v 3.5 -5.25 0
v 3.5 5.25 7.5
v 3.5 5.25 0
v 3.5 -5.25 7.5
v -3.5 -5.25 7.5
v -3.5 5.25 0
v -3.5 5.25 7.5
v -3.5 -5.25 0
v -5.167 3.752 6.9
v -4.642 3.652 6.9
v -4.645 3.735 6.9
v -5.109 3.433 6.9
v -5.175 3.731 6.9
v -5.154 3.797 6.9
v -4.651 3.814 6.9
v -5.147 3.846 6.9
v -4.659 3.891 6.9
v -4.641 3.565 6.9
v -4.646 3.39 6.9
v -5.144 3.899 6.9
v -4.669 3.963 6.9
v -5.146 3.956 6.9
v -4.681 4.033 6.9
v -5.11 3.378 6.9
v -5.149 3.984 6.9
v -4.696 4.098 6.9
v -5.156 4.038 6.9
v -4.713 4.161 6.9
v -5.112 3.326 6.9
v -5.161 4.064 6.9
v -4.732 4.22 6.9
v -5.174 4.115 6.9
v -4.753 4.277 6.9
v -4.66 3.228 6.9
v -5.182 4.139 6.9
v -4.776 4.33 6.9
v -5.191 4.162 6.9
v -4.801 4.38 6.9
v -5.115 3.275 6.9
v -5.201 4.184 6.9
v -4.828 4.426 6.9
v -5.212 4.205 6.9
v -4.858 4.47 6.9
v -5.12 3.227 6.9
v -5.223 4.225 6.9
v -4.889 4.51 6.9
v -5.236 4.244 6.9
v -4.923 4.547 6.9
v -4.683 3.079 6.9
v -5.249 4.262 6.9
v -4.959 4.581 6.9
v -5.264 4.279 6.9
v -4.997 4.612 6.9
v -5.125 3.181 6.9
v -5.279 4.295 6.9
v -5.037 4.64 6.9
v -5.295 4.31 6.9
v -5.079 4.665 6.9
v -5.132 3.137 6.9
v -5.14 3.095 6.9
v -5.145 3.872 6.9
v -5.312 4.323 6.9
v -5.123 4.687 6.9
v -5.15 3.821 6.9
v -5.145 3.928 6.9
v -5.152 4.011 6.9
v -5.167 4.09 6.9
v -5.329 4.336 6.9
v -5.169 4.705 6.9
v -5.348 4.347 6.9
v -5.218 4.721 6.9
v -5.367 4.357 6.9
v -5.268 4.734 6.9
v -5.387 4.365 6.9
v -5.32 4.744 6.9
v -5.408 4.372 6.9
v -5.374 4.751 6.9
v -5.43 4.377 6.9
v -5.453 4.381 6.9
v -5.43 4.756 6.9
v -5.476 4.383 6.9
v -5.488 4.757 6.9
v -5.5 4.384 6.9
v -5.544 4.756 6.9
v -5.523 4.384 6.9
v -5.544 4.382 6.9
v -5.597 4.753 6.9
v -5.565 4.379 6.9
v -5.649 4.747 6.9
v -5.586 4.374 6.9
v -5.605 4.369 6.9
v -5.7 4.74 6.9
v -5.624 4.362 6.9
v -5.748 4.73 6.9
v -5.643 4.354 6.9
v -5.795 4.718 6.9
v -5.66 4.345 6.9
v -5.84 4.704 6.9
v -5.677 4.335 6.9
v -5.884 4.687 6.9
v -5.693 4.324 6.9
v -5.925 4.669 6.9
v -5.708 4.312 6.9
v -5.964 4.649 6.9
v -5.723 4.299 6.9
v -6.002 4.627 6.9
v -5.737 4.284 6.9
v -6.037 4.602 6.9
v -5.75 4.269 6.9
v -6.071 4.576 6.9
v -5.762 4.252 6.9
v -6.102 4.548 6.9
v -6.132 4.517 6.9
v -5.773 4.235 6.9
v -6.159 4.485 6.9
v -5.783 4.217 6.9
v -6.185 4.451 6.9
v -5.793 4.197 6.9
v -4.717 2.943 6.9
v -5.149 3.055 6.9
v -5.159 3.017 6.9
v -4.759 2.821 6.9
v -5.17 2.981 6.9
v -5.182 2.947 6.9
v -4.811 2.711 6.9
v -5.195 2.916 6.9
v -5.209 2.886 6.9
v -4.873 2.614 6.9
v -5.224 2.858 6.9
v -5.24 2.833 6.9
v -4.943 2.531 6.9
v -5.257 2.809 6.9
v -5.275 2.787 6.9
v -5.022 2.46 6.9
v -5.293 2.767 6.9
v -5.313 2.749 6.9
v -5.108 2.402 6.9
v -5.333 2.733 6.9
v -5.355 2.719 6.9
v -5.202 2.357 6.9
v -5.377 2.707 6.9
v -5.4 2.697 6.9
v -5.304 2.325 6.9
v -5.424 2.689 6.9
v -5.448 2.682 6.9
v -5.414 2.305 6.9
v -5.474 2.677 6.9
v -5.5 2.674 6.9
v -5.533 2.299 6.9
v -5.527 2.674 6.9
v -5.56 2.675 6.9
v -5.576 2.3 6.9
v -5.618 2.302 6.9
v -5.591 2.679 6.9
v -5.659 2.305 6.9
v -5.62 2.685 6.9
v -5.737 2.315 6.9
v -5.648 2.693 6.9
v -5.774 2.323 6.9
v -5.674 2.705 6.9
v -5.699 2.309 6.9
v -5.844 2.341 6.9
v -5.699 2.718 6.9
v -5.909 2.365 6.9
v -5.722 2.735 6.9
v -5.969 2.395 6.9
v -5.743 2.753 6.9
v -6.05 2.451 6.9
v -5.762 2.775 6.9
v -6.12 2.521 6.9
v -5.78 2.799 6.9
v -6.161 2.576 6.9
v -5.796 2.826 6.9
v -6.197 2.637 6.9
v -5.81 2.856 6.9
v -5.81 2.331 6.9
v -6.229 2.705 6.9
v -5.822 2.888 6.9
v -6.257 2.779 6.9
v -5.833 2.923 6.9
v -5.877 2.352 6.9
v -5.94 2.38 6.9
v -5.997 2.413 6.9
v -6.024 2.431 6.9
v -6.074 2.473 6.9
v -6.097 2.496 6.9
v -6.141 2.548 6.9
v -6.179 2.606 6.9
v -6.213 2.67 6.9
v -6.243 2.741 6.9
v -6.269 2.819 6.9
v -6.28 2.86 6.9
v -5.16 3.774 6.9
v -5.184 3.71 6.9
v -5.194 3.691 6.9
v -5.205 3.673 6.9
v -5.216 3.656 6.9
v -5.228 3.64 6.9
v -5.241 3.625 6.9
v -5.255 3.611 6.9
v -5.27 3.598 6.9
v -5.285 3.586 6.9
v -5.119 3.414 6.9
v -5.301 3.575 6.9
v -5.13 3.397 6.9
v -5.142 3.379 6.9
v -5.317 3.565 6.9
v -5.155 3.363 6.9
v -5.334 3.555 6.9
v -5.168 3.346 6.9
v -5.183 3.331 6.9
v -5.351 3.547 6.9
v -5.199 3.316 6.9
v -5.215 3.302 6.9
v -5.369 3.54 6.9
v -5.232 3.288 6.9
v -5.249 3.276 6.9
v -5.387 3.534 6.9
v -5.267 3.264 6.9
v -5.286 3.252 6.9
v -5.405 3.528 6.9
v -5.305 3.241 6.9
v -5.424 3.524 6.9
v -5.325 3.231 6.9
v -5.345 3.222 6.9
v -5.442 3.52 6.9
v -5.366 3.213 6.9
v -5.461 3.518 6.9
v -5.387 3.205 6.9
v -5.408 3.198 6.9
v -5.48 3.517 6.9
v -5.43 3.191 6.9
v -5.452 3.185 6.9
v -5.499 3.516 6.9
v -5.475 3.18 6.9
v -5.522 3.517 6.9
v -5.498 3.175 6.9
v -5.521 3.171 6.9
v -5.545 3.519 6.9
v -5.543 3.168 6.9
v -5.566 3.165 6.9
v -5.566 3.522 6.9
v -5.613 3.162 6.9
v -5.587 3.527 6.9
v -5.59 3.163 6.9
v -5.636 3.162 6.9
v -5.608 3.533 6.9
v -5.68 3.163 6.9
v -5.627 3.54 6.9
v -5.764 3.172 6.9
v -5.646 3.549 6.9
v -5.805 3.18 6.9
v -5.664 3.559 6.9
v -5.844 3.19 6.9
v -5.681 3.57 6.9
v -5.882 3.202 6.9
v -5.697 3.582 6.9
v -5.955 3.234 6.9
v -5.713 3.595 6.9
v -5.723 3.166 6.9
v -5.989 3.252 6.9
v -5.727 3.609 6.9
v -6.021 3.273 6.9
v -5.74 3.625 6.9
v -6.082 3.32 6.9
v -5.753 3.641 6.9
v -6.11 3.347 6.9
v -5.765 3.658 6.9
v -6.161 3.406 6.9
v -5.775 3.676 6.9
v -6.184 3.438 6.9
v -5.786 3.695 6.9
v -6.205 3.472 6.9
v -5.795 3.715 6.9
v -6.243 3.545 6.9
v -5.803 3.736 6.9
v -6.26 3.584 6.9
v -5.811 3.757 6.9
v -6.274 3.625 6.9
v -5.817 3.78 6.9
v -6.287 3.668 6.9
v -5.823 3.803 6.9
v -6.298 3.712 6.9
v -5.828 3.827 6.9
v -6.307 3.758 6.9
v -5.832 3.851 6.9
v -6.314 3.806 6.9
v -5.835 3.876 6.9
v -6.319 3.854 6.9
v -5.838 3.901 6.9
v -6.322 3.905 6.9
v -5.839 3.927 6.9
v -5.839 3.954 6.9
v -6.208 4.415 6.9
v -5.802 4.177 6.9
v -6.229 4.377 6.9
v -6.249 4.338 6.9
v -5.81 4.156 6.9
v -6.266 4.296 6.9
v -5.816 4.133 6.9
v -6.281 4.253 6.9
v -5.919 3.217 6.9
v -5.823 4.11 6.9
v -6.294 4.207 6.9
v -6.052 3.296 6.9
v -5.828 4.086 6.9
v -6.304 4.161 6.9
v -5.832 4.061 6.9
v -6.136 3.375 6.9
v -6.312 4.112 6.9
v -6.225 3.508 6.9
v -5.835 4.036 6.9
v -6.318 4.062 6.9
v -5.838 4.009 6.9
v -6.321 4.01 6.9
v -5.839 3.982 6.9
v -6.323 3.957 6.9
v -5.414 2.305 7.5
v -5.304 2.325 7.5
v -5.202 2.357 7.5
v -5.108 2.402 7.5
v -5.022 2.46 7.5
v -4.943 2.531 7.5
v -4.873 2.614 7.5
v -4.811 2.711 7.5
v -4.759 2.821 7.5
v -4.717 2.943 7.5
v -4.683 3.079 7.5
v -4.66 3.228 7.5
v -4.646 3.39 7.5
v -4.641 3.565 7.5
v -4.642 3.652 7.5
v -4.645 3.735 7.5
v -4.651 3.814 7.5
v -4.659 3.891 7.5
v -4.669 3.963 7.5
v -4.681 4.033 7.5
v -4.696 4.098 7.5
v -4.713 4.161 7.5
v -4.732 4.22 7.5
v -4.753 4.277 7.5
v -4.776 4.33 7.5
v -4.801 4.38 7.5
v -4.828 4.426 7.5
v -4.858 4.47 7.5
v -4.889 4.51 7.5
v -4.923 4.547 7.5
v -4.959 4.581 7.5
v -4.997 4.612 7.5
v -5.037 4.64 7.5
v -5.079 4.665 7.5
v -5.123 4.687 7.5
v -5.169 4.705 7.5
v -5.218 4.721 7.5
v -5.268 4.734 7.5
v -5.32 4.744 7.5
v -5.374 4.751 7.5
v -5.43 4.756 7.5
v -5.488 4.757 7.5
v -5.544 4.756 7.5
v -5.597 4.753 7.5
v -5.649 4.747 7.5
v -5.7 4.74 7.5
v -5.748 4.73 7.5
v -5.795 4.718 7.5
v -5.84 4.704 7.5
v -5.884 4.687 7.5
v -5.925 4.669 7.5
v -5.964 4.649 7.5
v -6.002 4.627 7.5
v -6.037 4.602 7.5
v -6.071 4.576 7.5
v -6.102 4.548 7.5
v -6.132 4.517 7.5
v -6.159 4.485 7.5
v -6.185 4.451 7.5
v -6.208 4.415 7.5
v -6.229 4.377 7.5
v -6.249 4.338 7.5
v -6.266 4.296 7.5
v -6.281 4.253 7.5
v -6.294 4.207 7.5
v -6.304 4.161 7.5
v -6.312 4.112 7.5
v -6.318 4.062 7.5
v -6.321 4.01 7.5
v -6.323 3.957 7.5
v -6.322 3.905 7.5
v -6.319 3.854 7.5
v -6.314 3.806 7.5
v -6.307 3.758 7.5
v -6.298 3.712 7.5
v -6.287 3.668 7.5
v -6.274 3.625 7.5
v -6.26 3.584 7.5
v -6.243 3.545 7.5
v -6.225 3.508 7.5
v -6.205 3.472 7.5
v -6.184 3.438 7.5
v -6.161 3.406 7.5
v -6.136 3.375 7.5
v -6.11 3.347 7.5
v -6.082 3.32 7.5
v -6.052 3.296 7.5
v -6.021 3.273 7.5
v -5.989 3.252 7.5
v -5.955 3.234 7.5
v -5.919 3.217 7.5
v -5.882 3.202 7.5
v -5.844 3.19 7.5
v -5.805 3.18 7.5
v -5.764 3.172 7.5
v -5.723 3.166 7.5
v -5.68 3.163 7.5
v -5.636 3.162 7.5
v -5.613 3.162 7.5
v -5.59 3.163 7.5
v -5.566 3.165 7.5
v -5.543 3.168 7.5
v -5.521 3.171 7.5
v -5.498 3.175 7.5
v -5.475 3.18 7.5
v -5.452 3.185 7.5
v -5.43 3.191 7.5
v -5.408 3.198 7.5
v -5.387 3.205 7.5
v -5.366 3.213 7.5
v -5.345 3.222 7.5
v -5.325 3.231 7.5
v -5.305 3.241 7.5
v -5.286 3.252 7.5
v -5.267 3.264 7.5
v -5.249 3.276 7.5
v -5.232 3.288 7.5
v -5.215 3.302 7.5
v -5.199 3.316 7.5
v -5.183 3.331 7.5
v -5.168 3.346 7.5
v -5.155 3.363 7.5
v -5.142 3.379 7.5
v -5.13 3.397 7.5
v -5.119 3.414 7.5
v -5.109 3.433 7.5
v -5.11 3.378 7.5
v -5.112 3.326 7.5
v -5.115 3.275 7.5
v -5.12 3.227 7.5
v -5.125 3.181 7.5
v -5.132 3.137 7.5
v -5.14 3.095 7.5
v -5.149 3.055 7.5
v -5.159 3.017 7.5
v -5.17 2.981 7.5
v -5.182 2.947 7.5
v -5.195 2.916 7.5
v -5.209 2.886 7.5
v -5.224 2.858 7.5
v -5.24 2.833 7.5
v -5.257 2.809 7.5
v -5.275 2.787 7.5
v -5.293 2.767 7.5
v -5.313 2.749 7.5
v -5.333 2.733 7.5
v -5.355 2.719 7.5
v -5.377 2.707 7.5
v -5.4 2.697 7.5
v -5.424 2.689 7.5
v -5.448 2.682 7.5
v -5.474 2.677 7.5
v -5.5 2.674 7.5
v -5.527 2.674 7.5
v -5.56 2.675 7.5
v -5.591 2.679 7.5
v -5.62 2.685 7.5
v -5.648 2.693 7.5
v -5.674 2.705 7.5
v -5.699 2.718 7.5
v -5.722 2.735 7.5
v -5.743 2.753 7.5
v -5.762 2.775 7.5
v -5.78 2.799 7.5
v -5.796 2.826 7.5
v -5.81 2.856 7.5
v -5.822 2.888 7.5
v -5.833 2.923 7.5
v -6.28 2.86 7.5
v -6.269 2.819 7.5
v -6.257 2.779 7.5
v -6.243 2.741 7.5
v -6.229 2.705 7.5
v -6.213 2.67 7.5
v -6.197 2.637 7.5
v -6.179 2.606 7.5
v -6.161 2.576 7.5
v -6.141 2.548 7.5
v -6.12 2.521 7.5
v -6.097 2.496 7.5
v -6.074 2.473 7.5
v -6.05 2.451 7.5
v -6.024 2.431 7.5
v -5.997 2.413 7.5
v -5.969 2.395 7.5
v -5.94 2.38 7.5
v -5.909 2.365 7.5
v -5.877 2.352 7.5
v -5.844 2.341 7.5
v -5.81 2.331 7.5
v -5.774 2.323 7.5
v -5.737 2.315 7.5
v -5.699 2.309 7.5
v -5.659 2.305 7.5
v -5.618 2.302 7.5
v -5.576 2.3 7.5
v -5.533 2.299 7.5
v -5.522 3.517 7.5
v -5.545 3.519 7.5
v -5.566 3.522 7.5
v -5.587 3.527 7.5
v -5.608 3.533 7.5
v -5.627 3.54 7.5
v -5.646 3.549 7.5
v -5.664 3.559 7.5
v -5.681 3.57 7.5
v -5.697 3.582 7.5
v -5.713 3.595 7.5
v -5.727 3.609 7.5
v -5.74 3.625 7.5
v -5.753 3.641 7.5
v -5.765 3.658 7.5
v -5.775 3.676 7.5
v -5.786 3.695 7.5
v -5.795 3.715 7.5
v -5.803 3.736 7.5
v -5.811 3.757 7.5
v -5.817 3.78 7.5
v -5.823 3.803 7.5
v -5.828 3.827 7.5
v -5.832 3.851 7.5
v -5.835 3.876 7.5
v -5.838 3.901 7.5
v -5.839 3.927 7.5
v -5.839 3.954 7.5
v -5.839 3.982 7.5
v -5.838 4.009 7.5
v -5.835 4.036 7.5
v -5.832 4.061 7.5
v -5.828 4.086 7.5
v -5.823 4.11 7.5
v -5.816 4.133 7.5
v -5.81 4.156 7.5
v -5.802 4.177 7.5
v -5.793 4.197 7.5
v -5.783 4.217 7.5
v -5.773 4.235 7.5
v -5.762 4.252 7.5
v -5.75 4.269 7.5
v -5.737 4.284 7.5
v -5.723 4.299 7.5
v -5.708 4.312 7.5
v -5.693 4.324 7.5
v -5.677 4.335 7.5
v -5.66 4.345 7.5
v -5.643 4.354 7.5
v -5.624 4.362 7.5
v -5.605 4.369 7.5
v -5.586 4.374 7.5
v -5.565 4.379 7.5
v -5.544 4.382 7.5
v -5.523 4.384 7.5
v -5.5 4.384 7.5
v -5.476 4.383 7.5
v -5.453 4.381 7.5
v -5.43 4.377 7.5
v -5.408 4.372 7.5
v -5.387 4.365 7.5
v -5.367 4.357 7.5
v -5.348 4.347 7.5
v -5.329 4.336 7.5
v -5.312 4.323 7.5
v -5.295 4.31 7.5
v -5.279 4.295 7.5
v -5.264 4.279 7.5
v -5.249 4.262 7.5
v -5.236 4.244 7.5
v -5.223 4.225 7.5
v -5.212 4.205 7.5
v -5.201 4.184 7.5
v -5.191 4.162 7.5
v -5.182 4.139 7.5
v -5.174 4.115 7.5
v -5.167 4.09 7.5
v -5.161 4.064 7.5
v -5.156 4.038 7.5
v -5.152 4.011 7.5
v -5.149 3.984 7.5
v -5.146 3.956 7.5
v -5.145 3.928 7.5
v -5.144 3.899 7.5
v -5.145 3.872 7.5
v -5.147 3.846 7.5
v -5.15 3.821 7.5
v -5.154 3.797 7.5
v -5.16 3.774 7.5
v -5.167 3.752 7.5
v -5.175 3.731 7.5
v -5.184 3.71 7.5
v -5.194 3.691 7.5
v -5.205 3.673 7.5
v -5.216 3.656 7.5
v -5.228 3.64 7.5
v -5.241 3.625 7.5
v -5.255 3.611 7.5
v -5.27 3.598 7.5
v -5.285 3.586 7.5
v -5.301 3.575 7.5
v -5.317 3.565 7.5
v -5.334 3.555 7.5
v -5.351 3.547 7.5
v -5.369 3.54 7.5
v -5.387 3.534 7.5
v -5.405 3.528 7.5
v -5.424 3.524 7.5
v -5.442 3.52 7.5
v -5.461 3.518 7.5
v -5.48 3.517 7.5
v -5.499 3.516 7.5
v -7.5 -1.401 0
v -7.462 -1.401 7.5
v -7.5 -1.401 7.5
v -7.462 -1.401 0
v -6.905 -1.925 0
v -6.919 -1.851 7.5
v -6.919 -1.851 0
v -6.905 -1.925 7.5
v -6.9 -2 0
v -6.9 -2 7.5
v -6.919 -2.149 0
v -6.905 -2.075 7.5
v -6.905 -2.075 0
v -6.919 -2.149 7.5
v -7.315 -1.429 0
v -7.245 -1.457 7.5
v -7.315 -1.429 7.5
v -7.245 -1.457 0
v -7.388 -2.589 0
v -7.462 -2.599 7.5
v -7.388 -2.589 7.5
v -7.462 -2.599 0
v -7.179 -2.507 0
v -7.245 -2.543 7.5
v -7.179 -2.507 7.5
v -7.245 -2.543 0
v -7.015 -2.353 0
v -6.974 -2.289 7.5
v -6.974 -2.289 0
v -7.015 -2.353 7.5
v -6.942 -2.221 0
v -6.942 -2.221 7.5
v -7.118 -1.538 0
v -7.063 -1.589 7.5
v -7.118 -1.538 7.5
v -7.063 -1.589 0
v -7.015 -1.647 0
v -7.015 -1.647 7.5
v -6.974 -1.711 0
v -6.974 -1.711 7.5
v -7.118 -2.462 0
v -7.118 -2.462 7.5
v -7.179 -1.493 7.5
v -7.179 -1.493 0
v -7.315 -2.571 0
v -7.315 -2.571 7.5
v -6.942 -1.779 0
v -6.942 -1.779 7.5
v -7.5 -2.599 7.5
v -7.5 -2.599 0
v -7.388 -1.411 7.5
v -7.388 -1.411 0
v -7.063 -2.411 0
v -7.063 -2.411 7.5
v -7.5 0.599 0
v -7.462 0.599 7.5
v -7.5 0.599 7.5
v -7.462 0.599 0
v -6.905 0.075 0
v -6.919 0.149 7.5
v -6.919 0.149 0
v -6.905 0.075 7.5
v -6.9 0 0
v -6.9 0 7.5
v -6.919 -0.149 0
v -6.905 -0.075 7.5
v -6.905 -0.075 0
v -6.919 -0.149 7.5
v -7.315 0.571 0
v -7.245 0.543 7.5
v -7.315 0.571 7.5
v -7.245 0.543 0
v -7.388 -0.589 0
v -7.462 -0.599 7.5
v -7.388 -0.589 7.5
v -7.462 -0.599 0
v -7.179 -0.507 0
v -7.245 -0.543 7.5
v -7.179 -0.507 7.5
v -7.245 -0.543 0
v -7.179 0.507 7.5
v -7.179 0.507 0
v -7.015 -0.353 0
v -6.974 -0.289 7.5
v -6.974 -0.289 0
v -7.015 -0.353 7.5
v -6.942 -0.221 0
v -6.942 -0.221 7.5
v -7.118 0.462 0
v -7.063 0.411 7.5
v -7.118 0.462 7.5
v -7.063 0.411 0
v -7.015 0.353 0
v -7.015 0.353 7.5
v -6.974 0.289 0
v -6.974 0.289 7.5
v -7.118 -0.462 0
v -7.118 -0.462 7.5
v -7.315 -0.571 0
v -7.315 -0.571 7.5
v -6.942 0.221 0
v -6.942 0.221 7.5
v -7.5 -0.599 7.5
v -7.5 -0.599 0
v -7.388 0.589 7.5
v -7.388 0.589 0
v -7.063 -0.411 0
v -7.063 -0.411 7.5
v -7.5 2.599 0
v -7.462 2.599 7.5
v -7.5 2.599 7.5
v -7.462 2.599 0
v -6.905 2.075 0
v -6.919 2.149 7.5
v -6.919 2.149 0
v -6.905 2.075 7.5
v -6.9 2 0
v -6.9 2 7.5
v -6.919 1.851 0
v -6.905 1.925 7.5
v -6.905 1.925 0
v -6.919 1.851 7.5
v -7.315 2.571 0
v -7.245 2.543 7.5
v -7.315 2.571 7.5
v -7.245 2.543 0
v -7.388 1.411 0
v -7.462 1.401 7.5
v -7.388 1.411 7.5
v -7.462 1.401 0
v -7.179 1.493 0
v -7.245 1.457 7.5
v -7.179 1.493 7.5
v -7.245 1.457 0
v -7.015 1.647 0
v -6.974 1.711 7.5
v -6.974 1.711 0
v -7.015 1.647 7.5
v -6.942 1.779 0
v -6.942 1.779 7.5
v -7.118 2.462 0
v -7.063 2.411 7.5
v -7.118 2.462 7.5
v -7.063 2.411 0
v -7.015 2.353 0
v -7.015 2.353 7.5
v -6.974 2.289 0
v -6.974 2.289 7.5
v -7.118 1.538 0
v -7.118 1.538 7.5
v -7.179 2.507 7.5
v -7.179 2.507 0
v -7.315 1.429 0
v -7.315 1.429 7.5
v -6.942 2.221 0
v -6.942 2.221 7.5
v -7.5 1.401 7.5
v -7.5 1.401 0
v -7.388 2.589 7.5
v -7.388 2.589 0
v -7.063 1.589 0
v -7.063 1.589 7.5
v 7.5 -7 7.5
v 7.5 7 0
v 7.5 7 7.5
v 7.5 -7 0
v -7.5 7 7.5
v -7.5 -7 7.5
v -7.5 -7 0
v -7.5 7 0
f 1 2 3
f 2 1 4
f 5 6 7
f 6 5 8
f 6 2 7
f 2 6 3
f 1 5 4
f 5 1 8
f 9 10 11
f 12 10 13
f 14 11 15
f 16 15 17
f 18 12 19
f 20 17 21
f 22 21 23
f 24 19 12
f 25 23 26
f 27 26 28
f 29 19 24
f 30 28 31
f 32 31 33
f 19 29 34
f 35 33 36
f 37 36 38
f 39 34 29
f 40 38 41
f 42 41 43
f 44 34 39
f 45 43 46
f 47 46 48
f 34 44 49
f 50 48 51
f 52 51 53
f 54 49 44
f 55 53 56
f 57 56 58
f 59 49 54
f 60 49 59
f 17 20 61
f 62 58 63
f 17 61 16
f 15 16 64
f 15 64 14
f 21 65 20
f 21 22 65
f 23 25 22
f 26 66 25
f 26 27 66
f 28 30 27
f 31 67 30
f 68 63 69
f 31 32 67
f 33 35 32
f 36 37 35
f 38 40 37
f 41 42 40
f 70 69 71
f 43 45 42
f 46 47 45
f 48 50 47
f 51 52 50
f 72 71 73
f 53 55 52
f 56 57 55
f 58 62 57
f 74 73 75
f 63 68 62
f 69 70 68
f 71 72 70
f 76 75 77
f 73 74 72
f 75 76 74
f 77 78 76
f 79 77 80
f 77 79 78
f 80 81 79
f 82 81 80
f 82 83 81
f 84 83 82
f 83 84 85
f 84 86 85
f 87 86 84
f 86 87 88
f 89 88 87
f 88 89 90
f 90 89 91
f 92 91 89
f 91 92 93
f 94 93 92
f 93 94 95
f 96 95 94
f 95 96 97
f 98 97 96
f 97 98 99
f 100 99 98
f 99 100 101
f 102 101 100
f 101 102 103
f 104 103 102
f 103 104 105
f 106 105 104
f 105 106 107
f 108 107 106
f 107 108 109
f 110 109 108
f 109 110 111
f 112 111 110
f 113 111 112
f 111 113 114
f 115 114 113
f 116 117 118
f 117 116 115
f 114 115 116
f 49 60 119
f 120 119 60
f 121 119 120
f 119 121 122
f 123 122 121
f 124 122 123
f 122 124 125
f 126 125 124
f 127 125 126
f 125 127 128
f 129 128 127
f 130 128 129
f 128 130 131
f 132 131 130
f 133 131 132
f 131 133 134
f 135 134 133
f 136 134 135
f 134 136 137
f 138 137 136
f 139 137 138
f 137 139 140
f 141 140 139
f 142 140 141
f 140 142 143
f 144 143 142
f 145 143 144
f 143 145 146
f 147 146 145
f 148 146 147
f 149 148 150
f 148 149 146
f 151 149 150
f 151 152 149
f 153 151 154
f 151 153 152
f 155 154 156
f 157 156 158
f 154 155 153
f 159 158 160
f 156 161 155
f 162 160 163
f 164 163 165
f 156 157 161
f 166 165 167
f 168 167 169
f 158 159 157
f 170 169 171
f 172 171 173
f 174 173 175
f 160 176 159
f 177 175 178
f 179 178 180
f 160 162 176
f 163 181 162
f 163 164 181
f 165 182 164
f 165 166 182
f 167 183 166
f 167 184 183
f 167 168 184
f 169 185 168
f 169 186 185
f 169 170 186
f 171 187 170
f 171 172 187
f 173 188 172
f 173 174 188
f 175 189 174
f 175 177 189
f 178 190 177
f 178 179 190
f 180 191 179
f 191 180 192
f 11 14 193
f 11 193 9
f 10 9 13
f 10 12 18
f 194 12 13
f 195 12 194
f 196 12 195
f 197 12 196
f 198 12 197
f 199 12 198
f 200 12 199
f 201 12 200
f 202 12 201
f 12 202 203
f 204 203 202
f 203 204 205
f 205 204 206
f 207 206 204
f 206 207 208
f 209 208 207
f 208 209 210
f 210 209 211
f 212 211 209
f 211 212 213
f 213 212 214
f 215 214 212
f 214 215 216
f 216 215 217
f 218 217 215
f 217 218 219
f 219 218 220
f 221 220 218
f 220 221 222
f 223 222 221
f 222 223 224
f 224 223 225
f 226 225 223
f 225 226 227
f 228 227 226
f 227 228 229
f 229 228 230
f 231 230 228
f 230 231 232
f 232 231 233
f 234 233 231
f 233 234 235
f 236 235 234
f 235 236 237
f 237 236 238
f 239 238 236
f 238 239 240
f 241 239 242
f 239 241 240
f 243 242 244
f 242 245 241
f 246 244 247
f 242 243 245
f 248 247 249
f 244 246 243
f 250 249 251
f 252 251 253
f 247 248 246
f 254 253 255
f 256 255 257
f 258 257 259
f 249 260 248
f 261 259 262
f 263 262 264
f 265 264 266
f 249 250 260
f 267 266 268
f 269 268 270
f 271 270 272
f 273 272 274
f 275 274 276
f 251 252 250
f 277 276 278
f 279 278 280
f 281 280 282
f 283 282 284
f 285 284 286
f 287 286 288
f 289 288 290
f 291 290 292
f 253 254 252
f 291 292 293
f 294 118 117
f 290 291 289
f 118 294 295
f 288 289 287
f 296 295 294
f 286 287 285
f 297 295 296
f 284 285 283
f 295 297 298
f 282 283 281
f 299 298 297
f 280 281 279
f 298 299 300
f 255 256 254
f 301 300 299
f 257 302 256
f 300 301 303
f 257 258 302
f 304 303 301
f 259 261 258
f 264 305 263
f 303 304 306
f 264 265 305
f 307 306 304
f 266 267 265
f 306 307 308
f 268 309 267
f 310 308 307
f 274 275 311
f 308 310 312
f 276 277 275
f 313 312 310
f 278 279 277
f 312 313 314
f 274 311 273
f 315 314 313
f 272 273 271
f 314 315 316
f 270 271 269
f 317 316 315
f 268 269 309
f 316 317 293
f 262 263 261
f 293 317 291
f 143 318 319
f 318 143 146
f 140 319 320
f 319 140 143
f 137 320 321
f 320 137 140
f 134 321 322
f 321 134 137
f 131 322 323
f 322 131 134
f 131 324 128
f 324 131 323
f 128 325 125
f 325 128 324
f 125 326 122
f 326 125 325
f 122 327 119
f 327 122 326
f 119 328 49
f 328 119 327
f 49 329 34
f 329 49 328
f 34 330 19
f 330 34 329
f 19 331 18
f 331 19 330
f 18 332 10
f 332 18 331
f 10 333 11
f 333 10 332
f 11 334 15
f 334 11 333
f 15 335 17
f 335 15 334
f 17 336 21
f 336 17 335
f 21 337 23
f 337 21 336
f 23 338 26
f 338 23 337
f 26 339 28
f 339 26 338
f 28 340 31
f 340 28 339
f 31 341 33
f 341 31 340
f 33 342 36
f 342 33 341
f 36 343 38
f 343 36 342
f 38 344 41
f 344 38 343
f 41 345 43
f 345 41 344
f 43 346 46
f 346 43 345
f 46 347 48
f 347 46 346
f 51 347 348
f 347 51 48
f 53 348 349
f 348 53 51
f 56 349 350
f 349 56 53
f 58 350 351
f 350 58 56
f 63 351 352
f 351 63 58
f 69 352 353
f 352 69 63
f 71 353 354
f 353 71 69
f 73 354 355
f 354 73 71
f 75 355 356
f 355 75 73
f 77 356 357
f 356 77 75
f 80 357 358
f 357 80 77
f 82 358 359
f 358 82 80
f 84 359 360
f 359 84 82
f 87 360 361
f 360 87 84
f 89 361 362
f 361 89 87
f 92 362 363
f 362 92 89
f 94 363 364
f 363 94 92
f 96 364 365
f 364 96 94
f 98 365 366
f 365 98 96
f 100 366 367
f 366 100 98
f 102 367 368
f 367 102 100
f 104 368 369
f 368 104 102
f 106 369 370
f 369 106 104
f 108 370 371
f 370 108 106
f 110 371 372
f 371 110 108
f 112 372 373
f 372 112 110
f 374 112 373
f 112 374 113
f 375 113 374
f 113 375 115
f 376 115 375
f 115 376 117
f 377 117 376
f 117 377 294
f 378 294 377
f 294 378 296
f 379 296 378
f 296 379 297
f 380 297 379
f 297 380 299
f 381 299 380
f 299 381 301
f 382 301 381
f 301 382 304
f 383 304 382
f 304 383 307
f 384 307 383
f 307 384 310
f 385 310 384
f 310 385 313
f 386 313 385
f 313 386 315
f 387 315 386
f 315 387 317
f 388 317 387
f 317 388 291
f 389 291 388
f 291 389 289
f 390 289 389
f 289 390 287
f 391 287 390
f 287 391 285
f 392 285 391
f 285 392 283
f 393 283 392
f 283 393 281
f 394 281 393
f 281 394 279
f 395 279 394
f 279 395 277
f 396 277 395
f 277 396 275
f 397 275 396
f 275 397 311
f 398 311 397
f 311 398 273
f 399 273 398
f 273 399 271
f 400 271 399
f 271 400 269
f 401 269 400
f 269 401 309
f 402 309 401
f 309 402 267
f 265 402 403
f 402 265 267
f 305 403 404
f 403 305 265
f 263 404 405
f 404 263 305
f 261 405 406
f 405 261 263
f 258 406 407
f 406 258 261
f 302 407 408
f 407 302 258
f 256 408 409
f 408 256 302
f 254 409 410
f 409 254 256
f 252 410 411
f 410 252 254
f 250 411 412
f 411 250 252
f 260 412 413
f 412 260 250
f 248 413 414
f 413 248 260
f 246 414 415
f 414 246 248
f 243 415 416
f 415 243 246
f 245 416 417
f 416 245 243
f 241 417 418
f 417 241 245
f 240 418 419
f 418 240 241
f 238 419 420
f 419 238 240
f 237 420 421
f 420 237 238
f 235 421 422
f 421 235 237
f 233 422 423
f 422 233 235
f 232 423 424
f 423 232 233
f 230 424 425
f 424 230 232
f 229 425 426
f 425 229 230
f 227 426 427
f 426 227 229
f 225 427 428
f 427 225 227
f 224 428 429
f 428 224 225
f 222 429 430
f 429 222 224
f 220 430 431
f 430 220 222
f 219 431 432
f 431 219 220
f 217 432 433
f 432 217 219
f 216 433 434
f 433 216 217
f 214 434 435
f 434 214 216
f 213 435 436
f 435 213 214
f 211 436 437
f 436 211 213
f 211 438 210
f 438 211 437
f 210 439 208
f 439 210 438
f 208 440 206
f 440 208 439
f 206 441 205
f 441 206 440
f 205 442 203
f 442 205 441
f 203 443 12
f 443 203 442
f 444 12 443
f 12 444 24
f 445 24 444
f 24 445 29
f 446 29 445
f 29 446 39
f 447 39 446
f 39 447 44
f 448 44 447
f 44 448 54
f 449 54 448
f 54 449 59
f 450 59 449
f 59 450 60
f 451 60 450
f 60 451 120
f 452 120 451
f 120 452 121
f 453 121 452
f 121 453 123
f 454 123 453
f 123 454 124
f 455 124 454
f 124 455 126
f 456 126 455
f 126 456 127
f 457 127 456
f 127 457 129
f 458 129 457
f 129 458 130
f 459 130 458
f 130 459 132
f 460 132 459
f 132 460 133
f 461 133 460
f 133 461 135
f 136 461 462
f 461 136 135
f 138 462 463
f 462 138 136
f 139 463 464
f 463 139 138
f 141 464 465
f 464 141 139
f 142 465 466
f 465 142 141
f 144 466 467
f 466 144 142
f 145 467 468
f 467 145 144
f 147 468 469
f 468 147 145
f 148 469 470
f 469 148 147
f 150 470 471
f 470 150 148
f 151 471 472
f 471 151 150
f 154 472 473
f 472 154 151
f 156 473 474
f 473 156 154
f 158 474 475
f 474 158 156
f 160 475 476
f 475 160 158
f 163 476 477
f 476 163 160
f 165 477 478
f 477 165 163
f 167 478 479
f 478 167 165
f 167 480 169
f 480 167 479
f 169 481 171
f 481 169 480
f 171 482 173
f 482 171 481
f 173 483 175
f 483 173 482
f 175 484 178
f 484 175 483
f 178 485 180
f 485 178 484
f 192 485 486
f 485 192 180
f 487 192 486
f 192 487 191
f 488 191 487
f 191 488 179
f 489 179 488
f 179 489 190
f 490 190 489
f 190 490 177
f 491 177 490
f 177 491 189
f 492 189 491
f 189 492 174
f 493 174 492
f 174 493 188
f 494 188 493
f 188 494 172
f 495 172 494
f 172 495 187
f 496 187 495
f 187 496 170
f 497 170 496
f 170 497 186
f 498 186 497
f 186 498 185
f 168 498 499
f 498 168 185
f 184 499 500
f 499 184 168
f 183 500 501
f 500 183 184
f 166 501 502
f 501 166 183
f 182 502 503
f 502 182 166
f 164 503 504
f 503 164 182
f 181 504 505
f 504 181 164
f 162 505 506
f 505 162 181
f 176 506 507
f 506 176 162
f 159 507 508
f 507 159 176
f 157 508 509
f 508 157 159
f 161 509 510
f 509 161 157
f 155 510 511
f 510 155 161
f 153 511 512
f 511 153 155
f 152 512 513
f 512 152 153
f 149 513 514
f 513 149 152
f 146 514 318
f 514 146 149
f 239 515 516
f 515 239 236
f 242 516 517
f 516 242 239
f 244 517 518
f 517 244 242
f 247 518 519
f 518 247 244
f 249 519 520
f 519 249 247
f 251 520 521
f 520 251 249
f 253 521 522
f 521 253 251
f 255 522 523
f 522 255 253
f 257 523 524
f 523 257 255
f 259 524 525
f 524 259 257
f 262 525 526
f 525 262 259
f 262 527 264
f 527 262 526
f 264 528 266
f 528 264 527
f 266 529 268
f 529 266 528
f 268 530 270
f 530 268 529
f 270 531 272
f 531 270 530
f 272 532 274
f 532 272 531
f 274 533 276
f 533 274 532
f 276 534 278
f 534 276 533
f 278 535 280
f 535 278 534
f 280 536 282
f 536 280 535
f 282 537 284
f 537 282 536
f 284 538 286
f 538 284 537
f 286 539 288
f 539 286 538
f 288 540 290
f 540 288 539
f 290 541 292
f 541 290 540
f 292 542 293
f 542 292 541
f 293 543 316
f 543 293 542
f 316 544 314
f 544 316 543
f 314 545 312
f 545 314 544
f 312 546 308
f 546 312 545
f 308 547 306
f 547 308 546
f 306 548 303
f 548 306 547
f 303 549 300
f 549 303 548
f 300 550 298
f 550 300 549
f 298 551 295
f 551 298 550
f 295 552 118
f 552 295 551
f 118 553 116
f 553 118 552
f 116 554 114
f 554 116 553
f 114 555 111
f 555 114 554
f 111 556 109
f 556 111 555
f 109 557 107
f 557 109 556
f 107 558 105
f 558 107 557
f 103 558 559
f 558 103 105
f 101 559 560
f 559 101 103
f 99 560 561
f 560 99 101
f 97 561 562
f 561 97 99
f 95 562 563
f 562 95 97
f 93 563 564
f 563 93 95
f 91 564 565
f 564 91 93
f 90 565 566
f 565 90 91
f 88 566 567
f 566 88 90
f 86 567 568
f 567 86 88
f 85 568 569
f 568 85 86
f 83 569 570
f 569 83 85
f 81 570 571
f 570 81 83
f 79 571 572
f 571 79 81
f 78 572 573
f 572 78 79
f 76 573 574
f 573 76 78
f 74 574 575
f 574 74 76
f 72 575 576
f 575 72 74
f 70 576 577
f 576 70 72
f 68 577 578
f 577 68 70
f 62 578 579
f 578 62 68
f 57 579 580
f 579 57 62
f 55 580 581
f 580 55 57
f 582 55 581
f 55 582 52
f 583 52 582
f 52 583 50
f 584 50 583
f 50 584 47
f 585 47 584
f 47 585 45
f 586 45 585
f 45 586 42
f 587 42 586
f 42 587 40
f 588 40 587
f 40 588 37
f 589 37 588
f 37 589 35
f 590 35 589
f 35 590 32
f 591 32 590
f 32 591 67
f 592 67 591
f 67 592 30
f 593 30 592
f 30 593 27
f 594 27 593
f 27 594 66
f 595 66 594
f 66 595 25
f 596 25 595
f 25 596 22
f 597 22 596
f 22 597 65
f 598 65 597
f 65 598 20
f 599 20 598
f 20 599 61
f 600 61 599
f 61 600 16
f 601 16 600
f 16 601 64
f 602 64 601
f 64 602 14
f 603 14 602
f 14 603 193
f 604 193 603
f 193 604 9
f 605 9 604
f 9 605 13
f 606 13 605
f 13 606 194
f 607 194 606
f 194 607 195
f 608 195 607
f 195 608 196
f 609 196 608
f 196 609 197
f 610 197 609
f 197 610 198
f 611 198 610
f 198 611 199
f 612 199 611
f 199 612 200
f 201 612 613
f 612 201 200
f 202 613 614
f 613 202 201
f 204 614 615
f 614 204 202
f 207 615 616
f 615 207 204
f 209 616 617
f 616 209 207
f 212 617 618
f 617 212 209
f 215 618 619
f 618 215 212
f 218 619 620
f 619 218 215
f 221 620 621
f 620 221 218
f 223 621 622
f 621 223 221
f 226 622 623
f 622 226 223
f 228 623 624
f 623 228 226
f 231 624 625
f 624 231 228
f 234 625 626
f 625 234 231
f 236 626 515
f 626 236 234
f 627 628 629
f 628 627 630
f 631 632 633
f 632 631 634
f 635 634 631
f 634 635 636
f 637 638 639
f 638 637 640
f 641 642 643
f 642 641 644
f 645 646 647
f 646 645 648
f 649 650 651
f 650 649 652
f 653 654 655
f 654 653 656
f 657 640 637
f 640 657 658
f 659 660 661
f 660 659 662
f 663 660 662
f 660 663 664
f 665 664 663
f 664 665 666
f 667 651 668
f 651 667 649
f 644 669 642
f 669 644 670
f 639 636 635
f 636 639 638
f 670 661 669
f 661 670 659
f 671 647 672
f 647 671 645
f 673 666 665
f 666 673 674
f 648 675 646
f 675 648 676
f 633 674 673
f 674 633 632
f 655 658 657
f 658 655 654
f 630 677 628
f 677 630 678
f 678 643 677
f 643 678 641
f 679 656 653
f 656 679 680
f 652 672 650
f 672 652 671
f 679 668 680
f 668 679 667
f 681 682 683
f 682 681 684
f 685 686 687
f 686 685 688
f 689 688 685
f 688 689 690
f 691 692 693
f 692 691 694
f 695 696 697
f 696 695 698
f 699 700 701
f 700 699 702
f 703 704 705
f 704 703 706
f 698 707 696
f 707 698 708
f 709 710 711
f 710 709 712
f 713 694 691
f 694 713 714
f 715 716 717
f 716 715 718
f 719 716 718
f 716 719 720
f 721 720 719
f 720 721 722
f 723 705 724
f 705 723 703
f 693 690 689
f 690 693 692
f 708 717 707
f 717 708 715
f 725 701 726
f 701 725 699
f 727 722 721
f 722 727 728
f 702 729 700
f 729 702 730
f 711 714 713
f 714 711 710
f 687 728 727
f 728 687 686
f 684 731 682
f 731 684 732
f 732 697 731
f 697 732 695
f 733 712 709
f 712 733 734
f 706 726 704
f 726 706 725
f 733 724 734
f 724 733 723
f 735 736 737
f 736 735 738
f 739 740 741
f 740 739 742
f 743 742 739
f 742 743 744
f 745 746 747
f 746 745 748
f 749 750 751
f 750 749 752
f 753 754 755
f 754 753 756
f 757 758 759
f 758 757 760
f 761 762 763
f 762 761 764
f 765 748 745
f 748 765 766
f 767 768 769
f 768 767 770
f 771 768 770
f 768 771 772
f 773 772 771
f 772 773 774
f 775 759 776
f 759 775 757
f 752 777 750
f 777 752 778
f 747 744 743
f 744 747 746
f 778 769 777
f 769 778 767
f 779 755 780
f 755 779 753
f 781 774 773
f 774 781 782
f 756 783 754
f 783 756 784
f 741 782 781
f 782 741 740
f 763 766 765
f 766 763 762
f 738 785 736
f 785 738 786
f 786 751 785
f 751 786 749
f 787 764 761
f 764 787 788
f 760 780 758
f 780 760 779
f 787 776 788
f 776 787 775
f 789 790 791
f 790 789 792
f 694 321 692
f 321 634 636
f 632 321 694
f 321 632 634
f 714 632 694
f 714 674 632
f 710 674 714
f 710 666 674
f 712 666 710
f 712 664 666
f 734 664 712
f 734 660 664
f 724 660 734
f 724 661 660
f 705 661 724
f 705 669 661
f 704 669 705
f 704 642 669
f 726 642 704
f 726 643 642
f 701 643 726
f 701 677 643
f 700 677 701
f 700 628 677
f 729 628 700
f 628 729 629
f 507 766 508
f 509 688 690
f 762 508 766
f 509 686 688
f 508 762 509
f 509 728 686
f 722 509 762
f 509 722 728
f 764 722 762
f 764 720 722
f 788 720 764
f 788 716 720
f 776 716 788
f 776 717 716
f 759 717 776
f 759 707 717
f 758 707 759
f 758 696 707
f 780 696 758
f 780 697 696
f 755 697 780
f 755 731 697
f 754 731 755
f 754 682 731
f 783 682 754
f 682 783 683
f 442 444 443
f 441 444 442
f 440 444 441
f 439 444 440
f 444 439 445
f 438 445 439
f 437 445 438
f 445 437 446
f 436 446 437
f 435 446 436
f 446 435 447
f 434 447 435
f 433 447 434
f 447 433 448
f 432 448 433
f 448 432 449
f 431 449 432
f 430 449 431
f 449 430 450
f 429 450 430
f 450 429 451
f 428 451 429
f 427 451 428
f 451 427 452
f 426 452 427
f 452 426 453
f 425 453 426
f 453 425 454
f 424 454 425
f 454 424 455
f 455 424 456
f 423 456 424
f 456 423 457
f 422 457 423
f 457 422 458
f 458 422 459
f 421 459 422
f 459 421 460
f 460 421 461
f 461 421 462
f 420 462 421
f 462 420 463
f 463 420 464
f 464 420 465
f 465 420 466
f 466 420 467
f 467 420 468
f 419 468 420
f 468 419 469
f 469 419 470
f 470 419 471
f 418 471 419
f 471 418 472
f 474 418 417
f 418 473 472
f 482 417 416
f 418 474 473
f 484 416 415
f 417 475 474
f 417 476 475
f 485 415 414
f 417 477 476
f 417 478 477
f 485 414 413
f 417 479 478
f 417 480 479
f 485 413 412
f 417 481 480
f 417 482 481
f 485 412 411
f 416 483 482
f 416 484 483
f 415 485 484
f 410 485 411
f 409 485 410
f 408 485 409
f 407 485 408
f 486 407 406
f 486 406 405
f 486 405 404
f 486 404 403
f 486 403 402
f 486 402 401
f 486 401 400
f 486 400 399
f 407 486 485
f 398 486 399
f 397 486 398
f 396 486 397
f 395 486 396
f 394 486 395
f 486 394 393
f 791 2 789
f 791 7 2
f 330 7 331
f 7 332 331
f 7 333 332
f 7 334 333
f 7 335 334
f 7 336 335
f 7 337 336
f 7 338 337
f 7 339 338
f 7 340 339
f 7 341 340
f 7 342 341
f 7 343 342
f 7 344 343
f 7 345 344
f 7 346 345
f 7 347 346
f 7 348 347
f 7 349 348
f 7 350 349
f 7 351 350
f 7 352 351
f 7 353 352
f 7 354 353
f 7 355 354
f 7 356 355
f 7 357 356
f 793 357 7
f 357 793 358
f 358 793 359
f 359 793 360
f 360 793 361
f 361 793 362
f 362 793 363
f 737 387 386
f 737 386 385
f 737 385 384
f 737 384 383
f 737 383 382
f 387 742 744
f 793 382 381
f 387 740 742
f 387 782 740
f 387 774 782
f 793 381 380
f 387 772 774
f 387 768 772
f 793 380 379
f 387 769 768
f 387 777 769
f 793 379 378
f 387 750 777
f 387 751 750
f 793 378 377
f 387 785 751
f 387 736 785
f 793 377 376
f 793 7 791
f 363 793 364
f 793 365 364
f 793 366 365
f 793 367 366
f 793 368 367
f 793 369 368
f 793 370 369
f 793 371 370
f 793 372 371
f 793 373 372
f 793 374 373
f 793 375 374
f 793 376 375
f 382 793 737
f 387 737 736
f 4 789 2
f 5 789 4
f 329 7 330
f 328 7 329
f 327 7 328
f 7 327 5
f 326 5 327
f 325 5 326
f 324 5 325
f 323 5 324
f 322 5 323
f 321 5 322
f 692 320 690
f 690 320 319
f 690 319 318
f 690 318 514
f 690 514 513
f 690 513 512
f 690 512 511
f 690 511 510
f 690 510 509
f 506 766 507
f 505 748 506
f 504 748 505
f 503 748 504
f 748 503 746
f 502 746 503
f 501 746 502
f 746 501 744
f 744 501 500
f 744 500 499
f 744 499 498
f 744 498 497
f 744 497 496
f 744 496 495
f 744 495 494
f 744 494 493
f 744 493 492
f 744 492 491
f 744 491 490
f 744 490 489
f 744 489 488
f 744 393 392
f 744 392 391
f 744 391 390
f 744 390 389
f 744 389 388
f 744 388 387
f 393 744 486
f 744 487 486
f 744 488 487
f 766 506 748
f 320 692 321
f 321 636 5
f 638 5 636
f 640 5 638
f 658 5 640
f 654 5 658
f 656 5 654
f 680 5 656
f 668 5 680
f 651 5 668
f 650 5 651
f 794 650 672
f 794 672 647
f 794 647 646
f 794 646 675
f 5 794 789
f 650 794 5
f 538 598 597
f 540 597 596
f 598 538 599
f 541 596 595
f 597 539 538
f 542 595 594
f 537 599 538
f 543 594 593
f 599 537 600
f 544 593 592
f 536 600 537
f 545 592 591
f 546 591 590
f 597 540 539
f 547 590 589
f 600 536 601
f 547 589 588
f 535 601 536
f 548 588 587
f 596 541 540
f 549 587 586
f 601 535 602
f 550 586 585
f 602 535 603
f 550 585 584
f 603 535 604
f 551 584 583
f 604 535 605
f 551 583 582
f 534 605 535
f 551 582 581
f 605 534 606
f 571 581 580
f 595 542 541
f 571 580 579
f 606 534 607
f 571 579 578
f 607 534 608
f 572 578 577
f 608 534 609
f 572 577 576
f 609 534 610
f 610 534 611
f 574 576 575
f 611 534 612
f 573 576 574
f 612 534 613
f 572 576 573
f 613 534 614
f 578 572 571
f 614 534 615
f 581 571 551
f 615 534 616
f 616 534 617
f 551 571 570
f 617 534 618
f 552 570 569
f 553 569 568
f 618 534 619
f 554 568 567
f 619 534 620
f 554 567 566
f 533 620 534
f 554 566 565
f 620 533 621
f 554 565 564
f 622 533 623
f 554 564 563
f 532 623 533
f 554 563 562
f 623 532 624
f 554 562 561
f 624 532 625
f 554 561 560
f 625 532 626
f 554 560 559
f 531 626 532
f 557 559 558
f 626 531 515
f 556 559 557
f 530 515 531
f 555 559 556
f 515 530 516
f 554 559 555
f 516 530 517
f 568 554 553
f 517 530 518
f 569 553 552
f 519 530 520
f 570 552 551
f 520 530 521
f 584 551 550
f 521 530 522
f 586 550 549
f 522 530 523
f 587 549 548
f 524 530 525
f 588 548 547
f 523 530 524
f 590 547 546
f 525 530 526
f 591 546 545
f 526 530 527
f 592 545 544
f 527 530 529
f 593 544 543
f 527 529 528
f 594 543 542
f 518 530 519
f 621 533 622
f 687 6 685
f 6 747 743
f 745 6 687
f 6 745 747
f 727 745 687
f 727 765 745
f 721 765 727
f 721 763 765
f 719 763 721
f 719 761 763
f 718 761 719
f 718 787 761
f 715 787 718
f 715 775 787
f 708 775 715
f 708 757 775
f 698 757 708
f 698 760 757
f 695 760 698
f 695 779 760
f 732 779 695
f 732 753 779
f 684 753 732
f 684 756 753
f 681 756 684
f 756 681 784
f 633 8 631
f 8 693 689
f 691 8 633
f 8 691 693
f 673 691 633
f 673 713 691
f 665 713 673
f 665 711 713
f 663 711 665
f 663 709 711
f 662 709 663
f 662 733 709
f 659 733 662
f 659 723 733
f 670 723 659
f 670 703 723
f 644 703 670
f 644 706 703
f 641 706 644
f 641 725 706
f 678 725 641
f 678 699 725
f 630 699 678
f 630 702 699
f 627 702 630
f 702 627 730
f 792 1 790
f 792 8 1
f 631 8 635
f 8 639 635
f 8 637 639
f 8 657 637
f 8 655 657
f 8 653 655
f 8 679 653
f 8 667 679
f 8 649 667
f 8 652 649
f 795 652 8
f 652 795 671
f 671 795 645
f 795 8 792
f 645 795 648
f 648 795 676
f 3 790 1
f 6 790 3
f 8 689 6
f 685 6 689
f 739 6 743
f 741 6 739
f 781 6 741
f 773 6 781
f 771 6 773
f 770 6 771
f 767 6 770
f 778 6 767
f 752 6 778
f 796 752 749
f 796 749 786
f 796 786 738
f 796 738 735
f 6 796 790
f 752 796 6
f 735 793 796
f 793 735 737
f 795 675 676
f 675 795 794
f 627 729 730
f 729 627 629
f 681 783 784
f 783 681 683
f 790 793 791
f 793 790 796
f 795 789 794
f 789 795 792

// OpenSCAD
$fn = 50;

difference() {
	union() {
		translate(v = [0, -5, 0]) {
			rotate(a = [0, 0, 0]) {
				difference() {
					union() {
						translate(v = [-7.5, -2.0, 0]) {
							cube(size = [15.0, 14.0, 7.5]);
						}
					}
					union() {
						translate(v = [-3.5, -0.25, -0.1]) {
							cube(size = [7.0, 10.5, 7.7]);
						}
						translate(v = [-5.5, 8.5, 6.9]) {
							linear_extrude(height = 0.7) {
								text(font = "Arial:style=Bold", halign = "center", size = 2.5, text = "9", valign = "center");
							}
						}
						translate(v = [-7.5, 3, -0.1]) {
							cylinder(h = 7.7, r = 0.6);
						}
						translate(v = [-7.5, 5, -0.1]) {
							cylinder(h = 7.7, r = 0.6);
						}
						translate(v = [-7.5, 7, -0.1]) {
							cylinder(h = 7.7, r = 0.6);
						}
					}
				}
			}
		}
	}
	union();
}
